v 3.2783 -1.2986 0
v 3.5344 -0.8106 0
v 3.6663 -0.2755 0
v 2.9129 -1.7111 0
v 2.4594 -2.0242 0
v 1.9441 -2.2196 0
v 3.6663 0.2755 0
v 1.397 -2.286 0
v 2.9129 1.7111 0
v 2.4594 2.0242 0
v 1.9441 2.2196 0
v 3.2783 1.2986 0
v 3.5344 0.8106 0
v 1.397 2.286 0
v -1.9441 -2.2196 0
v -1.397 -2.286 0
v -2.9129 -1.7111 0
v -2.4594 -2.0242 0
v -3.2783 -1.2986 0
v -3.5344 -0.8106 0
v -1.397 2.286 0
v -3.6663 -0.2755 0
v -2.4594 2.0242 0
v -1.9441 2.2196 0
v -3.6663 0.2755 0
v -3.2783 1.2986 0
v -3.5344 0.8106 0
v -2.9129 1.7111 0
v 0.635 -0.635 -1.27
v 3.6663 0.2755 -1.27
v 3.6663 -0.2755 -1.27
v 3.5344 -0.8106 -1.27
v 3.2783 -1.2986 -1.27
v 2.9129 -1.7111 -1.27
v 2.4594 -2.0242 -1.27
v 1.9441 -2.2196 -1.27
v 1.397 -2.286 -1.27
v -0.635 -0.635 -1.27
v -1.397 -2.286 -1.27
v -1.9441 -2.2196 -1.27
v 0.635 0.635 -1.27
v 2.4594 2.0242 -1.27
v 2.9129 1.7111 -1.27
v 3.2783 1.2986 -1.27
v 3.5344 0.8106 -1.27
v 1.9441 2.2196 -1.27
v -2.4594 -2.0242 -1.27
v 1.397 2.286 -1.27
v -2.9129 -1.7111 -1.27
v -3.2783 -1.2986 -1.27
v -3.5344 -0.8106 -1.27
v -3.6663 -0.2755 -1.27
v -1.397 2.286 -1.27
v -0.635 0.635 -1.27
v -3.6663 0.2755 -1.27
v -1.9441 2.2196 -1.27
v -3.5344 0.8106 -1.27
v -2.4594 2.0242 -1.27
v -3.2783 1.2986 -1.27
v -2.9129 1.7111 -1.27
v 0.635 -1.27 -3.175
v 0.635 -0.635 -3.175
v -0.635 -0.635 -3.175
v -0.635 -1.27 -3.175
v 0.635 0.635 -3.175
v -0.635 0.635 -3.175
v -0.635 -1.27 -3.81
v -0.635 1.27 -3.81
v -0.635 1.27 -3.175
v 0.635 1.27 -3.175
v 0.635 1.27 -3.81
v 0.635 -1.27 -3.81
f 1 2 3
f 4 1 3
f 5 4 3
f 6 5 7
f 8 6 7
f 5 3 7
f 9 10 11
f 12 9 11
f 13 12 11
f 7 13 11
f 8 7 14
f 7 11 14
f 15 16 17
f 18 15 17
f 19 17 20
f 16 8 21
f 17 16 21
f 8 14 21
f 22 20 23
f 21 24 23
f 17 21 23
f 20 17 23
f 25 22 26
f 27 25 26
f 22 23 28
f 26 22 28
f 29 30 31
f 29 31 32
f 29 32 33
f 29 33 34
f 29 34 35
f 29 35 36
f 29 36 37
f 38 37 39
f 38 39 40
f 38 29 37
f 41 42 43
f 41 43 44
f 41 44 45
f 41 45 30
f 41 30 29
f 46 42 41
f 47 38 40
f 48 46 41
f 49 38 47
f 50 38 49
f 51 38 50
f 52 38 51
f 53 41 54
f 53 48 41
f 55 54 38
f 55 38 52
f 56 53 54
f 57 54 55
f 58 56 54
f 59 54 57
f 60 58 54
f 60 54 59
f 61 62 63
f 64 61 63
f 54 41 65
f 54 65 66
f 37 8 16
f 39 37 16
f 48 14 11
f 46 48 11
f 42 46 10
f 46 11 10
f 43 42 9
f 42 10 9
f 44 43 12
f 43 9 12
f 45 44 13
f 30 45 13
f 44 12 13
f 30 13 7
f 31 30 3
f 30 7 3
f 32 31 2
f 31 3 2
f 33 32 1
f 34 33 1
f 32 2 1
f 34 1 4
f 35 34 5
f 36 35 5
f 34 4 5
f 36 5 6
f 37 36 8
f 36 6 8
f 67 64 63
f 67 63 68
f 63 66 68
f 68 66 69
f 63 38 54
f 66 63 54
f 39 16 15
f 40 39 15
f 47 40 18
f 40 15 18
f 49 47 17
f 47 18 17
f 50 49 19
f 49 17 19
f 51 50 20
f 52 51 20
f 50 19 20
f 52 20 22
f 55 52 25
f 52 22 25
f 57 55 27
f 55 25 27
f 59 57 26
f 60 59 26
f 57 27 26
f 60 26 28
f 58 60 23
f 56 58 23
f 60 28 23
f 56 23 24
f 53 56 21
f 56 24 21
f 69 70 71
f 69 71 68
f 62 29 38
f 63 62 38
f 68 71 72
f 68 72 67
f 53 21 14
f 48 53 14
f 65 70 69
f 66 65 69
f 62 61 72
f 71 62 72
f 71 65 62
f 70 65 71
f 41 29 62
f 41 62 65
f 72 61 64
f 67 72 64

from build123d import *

# Parameters (mm, degrees)
BOSS_EXTRUDE1_DEPTH = 1.27
SKETCH5_W           = 1.27
SKETCH5_H           = 1.27
BOSS_EXTRUDE2_DEPTH = 1.905
SKETCH6_W           = 1.27
SKETCH6_H           = 2.54
BOSS_EXTRUDE3_DEPTH = 0.635


with BuildPart() as part:
    # Sketch3 → Boss-Extrude1 (new body)
    with BuildSketch(Plane.XY):
        with BuildLine():
            Line((-1.397, 2.286), (1.397, 2.286))
            ThreePointArc((1.397, 2.286), (3.683, 0), (1.397, -2.286))
            Line((1.397, -2.286), (-1.397, -2.286))
            ThreePointArc((-1.397, -2.286), (-3.683, 0), (-1.397, 2.286))
        make_face()
    extrude(amount=-BOSS_EXTRUDE1_DEPTH)

    # Sketch5 → Boss-Extrude2 (add)
    with BuildSketch(Plane(origin=(0, 0, -1.27), x_dir=(-1, 0, 0), z_dir=(0, 0, -1))):
        Rectangle(SKETCH5_W, SKETCH5_H)
    extrude(amount=BOSS_EXTRUDE2_DEPTH)

    # Sketch6 → Boss-Extrude3 (add)
    with BuildSketch(Plane(origin=(0, 0, -3.175), x_dir=(-1, 0, 0), z_dir=(0, 0, -1))):
        Rectangle(SKETCH6_W, SKETCH6_H)
    extrude(amount=BOSS_EXTRUDE3_DEPTH)


solid = part.part
